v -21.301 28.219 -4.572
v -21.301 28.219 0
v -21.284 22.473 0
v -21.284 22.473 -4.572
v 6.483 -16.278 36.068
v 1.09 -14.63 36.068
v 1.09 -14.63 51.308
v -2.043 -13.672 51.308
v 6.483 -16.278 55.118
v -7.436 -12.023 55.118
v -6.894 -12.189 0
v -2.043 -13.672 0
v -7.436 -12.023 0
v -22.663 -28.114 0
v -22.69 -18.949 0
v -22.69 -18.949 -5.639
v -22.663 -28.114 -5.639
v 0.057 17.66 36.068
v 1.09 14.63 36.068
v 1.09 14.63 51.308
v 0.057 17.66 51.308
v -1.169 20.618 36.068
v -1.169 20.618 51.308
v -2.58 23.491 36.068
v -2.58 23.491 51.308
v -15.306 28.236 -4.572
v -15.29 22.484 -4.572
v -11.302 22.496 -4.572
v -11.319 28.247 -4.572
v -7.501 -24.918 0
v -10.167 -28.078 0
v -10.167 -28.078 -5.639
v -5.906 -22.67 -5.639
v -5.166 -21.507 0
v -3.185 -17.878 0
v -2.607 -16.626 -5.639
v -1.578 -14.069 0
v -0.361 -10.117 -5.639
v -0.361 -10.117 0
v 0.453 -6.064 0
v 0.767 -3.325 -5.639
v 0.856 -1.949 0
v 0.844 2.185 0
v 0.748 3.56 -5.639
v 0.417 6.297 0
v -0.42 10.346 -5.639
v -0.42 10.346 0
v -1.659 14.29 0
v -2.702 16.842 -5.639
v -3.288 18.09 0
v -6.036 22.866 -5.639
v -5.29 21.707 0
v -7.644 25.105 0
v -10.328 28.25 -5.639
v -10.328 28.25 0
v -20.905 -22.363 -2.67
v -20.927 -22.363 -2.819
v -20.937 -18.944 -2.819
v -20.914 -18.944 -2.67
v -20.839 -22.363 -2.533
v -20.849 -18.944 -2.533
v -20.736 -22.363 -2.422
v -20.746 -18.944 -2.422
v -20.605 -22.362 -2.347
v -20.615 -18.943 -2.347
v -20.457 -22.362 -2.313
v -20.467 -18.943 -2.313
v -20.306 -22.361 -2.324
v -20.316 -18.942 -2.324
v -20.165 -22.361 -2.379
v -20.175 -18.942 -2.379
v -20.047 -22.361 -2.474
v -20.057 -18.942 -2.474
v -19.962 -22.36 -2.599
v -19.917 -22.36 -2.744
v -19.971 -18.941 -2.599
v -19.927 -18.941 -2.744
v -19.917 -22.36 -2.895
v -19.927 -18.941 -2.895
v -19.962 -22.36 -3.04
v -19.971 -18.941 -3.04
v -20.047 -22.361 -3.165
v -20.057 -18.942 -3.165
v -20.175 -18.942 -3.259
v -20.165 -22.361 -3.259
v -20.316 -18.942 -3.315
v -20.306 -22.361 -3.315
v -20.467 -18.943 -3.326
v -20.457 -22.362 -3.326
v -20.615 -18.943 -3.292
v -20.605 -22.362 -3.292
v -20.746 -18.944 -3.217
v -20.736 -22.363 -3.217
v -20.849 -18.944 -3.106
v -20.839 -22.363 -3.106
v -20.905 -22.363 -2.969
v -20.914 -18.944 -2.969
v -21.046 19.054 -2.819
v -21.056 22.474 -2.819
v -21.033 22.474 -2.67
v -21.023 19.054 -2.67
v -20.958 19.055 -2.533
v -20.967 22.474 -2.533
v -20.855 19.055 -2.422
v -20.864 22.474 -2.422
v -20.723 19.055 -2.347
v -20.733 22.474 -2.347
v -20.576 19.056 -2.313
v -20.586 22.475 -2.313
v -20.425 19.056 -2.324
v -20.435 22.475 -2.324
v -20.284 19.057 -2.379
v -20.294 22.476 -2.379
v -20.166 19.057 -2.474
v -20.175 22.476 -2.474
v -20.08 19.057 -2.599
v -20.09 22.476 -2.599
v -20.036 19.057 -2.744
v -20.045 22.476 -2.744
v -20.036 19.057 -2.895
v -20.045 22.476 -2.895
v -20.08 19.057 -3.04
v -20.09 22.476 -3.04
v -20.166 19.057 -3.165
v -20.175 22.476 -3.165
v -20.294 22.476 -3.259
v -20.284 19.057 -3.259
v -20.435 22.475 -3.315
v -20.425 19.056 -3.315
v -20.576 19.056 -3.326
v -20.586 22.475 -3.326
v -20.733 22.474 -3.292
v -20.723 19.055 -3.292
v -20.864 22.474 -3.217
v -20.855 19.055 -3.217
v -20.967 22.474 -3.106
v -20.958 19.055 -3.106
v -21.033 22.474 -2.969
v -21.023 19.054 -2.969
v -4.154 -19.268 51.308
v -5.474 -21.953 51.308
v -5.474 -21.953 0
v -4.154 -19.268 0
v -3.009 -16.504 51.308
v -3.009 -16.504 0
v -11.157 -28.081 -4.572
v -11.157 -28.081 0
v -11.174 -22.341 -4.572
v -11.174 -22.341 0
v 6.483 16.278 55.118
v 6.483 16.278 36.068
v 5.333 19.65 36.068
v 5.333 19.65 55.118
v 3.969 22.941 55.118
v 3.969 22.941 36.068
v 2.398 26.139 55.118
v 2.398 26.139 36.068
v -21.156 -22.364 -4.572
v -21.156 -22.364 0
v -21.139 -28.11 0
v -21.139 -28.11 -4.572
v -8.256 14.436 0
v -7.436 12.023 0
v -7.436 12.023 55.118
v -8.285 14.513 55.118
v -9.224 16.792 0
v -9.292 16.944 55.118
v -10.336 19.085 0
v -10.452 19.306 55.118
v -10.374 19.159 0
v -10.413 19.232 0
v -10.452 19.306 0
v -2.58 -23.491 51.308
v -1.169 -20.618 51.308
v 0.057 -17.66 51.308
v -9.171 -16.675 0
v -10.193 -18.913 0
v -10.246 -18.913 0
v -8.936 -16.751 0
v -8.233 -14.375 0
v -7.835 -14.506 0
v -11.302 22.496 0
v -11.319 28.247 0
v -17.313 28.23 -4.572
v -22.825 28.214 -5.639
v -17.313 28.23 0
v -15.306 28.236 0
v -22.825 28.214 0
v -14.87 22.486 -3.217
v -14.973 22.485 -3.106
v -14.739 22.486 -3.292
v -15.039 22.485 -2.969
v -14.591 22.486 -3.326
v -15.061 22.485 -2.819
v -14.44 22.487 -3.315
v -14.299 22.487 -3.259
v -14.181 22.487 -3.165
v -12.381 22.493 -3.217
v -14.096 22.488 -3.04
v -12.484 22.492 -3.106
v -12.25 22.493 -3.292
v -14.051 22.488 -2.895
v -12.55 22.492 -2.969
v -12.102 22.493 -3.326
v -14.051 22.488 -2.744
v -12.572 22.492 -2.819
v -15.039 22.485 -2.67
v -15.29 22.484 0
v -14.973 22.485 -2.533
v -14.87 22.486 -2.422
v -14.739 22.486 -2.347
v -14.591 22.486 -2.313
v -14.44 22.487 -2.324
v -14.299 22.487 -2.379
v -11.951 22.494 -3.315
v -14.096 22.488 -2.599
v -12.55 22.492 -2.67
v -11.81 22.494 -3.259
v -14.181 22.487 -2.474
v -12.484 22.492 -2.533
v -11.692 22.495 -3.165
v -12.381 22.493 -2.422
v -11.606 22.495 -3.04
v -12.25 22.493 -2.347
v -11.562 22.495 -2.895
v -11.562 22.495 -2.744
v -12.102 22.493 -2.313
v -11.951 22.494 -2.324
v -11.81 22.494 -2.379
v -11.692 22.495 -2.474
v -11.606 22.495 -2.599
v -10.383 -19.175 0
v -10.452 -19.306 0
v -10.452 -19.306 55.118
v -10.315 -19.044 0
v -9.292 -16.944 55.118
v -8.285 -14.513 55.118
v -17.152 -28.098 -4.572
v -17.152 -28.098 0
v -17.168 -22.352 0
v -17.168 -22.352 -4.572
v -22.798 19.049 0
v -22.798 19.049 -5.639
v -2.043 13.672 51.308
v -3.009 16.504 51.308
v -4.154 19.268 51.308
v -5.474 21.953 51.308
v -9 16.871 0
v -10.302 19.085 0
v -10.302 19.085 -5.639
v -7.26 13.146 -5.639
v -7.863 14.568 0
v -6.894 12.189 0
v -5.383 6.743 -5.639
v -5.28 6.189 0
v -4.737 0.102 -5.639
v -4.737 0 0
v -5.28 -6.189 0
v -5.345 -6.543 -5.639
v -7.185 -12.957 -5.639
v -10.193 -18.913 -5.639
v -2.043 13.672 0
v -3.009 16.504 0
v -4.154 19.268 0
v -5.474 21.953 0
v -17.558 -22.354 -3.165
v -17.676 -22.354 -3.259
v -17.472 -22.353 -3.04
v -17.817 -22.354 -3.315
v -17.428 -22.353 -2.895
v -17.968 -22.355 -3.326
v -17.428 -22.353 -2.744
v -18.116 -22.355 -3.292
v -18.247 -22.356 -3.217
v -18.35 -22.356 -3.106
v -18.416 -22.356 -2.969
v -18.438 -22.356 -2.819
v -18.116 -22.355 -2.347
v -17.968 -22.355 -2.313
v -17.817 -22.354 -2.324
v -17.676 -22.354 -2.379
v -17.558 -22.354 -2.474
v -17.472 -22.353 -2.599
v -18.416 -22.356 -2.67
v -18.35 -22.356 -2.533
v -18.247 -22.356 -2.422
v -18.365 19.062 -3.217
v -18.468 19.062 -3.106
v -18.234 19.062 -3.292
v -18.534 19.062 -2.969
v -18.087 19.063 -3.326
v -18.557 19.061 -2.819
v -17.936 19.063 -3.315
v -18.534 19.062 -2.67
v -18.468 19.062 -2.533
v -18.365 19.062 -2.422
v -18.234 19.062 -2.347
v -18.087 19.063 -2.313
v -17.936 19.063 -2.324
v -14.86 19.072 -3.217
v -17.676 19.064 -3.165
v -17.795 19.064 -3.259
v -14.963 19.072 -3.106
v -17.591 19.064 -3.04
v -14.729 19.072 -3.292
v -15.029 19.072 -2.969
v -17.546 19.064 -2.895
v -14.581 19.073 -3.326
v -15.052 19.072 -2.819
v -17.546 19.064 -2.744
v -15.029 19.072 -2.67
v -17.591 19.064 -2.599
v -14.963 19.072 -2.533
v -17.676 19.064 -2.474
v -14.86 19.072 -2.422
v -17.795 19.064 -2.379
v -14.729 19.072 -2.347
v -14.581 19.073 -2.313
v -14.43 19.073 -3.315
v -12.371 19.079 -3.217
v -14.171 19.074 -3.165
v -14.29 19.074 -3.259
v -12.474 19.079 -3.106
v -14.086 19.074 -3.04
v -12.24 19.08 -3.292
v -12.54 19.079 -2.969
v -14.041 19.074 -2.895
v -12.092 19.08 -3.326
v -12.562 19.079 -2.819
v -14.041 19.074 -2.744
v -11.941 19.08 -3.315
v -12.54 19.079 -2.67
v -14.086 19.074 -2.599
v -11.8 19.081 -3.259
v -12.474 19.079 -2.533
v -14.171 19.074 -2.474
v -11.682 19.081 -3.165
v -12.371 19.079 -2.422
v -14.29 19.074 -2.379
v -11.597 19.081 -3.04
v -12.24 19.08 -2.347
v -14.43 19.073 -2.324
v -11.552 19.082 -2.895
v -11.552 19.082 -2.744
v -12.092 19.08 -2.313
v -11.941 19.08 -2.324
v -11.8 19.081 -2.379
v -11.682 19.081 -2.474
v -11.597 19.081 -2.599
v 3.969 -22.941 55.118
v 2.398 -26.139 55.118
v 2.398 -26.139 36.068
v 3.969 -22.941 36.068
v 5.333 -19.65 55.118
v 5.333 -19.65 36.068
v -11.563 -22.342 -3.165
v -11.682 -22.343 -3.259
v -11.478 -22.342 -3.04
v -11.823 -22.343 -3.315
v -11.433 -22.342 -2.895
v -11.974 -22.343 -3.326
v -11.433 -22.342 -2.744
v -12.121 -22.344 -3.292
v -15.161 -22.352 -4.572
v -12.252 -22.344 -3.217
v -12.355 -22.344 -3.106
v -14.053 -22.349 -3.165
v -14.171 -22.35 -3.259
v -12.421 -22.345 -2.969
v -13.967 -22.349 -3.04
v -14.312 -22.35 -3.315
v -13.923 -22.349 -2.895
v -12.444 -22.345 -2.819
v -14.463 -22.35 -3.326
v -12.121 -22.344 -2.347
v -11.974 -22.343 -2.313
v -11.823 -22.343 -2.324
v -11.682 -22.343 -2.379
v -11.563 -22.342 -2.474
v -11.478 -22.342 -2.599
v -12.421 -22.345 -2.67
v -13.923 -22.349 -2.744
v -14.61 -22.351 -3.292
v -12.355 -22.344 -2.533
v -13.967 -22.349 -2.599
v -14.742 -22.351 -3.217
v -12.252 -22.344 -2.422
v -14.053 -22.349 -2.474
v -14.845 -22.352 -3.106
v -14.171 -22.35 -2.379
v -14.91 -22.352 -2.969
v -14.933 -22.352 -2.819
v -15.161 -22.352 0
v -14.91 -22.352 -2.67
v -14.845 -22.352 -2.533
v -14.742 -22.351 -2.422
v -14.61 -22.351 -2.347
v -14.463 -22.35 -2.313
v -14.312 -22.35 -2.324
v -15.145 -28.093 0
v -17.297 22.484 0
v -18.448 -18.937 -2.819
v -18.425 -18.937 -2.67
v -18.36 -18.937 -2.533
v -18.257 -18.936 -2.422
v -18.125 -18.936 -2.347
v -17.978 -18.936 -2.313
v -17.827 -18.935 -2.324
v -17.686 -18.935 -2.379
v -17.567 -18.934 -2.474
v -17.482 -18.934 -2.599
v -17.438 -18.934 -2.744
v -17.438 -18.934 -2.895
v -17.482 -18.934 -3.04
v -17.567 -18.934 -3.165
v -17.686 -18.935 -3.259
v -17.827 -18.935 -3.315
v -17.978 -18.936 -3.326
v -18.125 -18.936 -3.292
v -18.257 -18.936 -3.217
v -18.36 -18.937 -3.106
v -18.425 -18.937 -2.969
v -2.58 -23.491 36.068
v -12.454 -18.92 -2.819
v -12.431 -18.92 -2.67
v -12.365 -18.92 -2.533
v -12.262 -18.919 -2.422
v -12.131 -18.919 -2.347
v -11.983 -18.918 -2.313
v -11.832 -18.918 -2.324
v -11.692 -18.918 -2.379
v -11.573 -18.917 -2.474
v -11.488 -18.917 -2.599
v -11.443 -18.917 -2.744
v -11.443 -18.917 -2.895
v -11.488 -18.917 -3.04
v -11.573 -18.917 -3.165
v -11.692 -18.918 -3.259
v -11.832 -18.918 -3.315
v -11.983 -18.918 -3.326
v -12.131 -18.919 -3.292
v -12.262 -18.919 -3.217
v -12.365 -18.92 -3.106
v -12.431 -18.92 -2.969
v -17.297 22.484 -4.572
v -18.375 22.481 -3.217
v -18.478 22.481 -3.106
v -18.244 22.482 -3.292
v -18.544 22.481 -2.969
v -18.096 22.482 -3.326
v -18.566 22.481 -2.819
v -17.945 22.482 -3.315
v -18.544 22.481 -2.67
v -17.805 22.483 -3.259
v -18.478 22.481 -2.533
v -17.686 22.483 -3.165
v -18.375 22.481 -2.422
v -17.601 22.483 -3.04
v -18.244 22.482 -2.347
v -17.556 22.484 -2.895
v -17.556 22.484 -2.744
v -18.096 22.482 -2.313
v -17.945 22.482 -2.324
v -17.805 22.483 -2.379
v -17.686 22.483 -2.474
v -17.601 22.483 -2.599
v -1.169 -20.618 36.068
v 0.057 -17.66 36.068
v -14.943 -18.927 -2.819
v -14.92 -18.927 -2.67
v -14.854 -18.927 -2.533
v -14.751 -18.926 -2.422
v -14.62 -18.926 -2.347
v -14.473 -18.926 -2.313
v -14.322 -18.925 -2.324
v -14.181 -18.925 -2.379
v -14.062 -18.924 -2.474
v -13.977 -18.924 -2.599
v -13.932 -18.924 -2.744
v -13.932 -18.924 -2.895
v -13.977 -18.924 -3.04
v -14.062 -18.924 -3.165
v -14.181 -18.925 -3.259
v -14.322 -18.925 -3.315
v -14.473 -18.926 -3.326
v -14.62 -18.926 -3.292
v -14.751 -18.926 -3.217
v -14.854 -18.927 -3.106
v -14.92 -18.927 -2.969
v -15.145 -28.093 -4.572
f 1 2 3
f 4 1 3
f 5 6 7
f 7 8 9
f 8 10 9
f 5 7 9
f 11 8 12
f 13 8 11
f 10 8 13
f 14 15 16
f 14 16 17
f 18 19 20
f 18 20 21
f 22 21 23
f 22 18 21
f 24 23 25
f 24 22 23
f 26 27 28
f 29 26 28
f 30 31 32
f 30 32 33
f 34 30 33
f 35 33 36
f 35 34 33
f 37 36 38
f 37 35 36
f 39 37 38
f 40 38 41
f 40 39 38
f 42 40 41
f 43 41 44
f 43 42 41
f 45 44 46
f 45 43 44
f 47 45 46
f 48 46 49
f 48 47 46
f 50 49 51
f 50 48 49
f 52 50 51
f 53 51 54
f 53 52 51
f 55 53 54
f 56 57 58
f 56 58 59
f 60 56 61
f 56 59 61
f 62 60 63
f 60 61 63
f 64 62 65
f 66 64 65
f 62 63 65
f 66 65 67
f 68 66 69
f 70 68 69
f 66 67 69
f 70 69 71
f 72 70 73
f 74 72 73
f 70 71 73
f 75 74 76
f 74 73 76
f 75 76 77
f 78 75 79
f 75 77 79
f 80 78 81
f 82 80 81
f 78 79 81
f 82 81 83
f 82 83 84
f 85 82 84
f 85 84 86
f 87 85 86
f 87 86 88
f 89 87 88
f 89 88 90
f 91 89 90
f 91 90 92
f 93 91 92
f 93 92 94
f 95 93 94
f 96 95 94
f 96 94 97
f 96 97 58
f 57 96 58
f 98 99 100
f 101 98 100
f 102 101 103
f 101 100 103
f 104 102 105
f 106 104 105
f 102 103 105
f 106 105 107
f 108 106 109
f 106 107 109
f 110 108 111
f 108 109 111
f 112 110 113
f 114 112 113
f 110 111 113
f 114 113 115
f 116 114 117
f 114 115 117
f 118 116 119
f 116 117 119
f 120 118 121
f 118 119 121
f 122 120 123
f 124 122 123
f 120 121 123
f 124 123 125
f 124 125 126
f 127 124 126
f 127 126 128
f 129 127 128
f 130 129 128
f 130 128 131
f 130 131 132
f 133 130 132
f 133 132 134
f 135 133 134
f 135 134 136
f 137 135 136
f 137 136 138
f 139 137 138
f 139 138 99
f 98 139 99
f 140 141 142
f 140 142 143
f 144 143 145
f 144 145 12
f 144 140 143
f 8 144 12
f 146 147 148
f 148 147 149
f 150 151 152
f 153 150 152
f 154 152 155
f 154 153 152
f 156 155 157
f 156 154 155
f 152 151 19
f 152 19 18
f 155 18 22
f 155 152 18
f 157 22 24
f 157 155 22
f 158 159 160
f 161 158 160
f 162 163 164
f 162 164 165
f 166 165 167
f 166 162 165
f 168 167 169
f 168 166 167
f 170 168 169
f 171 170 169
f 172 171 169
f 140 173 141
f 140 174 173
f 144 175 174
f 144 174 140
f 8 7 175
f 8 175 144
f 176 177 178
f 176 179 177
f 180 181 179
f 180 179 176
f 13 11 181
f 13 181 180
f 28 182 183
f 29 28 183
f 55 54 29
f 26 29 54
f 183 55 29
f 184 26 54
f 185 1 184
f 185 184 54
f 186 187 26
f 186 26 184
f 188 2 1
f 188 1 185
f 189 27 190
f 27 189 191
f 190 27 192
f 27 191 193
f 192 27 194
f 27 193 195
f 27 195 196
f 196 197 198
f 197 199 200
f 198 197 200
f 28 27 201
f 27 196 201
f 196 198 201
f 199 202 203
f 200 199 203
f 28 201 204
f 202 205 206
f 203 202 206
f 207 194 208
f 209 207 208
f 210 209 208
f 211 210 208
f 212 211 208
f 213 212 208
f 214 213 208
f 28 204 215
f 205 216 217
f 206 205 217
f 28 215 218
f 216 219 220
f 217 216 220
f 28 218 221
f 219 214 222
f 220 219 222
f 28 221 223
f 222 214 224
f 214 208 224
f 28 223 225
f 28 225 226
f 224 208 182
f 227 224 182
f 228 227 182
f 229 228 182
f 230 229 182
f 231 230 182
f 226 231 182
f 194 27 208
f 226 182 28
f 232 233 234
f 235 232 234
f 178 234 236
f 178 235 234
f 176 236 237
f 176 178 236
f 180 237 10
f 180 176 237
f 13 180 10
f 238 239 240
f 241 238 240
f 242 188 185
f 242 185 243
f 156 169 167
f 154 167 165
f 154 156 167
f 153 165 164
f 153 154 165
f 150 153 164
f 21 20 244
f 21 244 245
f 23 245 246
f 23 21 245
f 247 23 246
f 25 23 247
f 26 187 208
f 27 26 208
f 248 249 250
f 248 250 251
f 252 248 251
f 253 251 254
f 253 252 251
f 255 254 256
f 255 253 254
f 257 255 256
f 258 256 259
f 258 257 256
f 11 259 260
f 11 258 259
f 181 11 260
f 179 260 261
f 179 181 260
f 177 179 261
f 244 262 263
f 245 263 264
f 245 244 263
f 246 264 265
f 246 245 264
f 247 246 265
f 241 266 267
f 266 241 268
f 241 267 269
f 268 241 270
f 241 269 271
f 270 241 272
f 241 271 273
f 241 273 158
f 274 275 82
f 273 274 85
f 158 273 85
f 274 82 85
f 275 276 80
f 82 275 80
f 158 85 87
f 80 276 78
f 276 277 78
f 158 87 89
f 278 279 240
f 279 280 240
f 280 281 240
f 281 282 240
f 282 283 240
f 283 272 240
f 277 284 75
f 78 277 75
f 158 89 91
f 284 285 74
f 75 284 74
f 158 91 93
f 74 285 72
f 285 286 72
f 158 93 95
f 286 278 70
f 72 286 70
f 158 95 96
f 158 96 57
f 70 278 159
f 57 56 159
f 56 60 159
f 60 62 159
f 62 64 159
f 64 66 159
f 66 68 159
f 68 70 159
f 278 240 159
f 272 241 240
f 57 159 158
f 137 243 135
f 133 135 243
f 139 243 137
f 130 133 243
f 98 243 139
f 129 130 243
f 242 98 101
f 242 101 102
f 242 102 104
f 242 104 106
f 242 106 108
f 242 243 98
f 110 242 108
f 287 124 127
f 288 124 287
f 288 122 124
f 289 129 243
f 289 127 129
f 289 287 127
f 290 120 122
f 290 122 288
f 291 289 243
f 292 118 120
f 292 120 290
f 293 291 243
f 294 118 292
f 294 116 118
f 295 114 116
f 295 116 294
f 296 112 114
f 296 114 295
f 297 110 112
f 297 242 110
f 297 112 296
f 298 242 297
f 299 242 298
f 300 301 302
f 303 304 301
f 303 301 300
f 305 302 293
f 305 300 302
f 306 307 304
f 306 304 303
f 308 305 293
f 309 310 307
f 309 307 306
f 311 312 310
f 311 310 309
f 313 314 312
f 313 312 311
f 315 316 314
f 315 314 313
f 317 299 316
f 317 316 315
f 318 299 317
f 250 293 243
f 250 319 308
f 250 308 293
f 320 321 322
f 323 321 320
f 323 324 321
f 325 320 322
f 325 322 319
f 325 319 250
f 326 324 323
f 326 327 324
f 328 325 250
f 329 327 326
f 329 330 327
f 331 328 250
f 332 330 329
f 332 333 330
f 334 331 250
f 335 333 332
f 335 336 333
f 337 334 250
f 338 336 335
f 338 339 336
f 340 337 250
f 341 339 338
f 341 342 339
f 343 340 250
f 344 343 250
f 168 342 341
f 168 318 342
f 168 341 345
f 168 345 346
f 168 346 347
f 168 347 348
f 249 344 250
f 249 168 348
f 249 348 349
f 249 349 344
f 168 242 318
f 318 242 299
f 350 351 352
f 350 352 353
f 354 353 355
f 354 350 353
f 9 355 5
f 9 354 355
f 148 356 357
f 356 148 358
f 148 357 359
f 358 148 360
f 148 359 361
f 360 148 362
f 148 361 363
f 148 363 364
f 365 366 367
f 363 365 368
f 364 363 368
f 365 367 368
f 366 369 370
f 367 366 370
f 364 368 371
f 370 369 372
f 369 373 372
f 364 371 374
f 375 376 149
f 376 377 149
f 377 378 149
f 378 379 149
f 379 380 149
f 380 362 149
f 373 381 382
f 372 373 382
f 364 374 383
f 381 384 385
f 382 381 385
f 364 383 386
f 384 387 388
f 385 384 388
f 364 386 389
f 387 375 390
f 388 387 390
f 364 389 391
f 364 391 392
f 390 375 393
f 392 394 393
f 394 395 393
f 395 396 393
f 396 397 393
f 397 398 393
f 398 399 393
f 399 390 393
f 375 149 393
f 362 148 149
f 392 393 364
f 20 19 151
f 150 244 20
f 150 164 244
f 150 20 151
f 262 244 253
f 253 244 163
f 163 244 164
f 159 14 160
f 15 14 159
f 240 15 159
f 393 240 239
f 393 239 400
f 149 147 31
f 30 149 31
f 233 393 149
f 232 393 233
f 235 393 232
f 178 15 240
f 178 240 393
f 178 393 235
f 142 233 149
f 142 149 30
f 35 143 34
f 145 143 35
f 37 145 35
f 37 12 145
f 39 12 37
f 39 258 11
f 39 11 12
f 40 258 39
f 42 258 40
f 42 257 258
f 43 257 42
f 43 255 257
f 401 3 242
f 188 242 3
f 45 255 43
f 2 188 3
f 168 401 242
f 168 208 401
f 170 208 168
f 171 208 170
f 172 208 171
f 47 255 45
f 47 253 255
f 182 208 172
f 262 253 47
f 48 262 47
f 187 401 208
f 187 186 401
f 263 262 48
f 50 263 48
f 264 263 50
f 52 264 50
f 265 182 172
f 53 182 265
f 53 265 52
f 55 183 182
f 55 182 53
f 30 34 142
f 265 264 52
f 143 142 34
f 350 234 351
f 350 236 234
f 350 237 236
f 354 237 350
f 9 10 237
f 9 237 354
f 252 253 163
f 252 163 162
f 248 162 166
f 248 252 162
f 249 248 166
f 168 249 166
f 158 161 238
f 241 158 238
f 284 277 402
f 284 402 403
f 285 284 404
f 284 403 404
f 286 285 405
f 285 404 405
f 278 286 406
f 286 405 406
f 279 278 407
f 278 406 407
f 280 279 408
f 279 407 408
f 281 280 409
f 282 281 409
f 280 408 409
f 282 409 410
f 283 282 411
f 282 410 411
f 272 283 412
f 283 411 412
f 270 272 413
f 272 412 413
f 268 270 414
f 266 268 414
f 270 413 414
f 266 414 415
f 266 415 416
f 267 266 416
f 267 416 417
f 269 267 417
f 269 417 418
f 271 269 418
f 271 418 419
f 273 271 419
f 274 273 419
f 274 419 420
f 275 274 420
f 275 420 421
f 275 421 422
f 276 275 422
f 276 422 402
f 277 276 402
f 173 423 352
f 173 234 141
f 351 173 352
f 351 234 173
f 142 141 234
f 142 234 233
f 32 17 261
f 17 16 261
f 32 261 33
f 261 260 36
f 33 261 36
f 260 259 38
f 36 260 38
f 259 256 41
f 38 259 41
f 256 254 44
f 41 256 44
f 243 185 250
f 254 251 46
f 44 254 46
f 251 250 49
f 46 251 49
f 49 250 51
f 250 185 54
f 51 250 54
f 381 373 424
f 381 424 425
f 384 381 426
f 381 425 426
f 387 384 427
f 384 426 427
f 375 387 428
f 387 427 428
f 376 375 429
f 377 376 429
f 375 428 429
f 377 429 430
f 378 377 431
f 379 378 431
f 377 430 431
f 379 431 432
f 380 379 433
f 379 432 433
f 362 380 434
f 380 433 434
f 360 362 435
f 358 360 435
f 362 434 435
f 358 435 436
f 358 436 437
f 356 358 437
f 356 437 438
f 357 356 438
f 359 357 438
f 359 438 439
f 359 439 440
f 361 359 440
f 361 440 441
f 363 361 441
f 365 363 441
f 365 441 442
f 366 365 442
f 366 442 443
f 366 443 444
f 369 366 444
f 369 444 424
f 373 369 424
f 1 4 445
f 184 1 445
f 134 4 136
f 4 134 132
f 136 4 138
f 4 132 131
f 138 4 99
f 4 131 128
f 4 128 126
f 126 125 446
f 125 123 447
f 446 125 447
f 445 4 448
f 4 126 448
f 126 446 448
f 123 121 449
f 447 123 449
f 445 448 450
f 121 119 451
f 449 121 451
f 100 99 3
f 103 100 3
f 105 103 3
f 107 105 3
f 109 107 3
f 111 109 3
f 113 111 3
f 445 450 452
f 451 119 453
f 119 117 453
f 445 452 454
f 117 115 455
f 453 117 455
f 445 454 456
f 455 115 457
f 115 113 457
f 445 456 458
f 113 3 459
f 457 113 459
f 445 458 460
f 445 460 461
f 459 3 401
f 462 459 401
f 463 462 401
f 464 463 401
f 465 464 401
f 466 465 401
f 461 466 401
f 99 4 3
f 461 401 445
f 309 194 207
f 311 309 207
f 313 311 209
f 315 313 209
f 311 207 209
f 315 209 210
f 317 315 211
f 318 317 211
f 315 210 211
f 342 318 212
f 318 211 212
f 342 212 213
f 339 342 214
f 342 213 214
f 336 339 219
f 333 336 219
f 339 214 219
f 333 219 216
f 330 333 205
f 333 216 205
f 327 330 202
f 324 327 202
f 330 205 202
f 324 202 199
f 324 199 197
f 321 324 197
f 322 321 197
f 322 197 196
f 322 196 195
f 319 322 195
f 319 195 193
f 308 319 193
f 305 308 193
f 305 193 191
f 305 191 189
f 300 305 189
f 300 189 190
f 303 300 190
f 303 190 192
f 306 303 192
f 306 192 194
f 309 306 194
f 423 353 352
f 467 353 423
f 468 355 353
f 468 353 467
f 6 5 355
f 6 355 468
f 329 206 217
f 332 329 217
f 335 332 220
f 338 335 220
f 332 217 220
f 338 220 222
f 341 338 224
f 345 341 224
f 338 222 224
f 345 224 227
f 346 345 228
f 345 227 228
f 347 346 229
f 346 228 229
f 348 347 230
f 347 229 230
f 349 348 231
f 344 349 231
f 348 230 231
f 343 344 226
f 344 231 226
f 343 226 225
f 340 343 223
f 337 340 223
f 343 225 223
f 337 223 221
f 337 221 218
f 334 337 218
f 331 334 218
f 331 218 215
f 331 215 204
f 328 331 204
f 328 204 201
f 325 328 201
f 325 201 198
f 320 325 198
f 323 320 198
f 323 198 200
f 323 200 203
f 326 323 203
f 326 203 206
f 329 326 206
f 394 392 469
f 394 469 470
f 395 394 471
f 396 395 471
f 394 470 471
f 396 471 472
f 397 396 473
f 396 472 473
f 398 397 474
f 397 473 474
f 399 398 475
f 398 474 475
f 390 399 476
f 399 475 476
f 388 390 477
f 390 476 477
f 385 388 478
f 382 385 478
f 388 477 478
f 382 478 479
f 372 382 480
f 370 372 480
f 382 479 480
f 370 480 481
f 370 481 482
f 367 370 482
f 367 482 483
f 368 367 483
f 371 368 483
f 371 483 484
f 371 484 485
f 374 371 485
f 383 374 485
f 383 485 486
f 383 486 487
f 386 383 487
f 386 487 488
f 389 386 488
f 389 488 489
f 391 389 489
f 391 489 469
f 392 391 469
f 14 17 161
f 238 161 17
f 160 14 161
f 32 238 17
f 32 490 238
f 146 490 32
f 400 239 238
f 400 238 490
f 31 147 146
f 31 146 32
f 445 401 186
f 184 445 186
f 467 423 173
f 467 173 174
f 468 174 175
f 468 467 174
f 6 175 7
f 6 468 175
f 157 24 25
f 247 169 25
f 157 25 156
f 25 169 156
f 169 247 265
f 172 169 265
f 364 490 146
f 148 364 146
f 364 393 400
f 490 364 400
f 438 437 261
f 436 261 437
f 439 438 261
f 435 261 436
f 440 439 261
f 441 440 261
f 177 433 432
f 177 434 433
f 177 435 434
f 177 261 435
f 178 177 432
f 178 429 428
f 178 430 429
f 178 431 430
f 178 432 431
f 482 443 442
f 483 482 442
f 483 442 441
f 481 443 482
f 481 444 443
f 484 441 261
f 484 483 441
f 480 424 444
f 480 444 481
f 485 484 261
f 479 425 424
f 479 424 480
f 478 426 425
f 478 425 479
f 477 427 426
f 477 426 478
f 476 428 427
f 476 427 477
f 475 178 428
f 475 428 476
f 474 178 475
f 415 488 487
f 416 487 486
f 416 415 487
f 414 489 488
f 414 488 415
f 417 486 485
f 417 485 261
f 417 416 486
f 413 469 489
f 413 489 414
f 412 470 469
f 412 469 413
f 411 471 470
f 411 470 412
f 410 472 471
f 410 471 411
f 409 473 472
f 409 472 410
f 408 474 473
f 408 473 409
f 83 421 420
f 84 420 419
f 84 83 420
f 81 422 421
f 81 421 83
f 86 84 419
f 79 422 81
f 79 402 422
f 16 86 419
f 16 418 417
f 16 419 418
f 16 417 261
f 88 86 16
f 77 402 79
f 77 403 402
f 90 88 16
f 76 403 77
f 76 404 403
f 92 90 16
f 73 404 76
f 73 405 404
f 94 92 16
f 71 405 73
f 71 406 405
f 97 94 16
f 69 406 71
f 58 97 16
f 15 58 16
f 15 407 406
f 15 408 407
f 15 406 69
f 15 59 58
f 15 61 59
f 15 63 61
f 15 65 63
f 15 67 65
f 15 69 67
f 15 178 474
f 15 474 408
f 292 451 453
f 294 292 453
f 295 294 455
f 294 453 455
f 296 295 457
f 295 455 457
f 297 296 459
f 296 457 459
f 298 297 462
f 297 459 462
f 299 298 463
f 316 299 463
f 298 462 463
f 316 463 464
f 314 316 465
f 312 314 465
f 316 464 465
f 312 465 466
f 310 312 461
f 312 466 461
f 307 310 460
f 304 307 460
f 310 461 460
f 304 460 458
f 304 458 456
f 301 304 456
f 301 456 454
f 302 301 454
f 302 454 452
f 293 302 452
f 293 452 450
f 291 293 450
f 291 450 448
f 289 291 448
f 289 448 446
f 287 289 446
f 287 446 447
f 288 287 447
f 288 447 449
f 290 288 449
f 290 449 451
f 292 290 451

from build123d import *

# Parameters (mm, degrees)
F1_ANGLE_BACK = 28
F1_ANGLE      = 56
F2_ANGLE_BACK = 17
F2_ANGLE      = 34
F4_DEPTH      = 5.6388
F6_DEPTH      = 4.572
F7_R          = 0.508
F8_DEPTH      = 99.568
F9_R          = 0.508
F10_DEPTH     = 72.39


with BuildPart() as f1:
    # F0 (on Front) → F1 (revolve)
    with BuildSketch(Plane.XZ, mode=Mode.PRIVATE) as f1_sk:
        Polygon((0, 0), (0, 51.308), (3.2766, 51.308), (3.2766, 36.068), (8.9154, 36.068), (8.9154, 55.118), (-5.6388, 55.118), (-5.6388, 0), align=None)
    revolve(f1_sk.sketch.rotate(Axis((-46.7614, 0, 20.3579571098), (0, 0, 1)), -F1_ANGLE_BACK), axis=Axis((-46.7614, 0, 20.3579571098), (0, 0, 1)), revolution_arc=F1_ANGLE)

    # F0 (on Front) → F2 (revolve, cut)
    with BuildSketch(Plane.XZ, mode=Mode.PRIVATE) as f2_sk:
        Polygon((0, 0), (0, 51.308), (3.2766, 51.308), (3.2766, 36.068), (8.9154, 36.068), (8.9154, 55.118), (-5.6388, 55.118), (-5.6388, 0), align=None)
    revolve(f2_sk.sketch.rotate(Axis((-46.7614, 0, 20.3579571098), (0, 0, -1)), -F2_ANGLE_BACK), axis=Axis((-46.7614, 0, 20.3579571098), (0, 0, -1)), revolution_arc=F2_ANGLE, mode=Mode.SUBTRACT)

    # F3 (on Top) → F4 (join)
    with BuildSketch(Plane.XY):
        with BuildLine():
            Line((-22.6634080678, -28.1140467498), (-10.1666593224, -28.0782552096))
            ThreePointArc((-10.1666593224, -28.0782552096), (0.9017854761, 0.1178501934), (-10.3279875482, 28.2500919806))
            Line((-10.3279875482, 28.2500919806), (-22.8247362936, 28.2143004404))
            Line((-22.8247362936, 28.2143004404), (-22.7984871846, 19.0493268453))
            Line((-22.7984871846, 19.0493268453), (-10.3017384392, 19.0851183855))
            ThreePointArc((-10.3017384392, 19.0851183855), (-4.7369913968, 0.1017003521), (-10.1929084315, -18.9132816145))
            Line((-10.1929084315, -18.9132816145), (-22.6896571769, -18.9490731547))
            Line((-22.6896571769, -18.9490731547), (-22.6634080678, -28.1140467498))
        make_face()
    extrude(amount=-F4_DEPTH)

    # F5 (on face) → F6 (cut)
    with BuildSketch(Plane.XY):
        Polygon((-21.1558706034, -22.363909105), (-21.1394143184, -28.1096819278), (-17.151630674, -28.0982606436), (-17.168086959, -22.3524878208), align=None)
        Polygon((-15.161486959, -22.3524878208), (-15.1450471338, -28.0925136516), (-11.1572634894, -28.0810923674), (-11.1737033147, -22.3410665366), align=None)
        Polygon((-17.2965026148, 22.4843137237), (-17.3129588998, 28.2300865465), (-21.3007425442, 28.2186652623), (-21.2842862592, 22.4728924395), align=None)
        Polygon((-11.3021189705, 22.4957350078), (-11.3185917152, 28.2472548227), (-15.3063753596, 28.2358335385), (-15.2899026148, 22.4843137237), align=None)
    extrude(amount=-F6_DEPTH, mode=Mode.SUBTRACT)

    # F7 (on face) → F8 (cut)
    with BuildSketch(Plane(origin=(-0.0645214991, 22.527920253, 0), x_dir=(-0.9999958986, -0.0028640564, 0), z_dir=(-0.0028640564, 0.9999958986, 0))):
        with Locations((11.9996435616, -2.8194)):
            Circle(F7_R)
        with Locations((14.4888435616, -2.8194)):
            Circle(F7_R)
    extrude(amount=-F8_DEPTH, mode=Mode.SUBTRACT)

    # F9 (on face) → F10 (cut)
    with BuildSketch(Plane(origin=(-0.0645379589, 22.533667245, 0), x_dir=(-0.9999958986, -0.0028640564, 0), z_dir=(-0.0028640564, 0.9999958986, 0))):
        with Locations((17.9940353317, -2.8194)):
            Circle(F9_R)
        with Locations((20.4832353317, -2.8194)):
            Circle(F9_R)
    extrude(amount=-F10_DEPTH, mode=Mode.SUBTRACT)


solid = f1.part
